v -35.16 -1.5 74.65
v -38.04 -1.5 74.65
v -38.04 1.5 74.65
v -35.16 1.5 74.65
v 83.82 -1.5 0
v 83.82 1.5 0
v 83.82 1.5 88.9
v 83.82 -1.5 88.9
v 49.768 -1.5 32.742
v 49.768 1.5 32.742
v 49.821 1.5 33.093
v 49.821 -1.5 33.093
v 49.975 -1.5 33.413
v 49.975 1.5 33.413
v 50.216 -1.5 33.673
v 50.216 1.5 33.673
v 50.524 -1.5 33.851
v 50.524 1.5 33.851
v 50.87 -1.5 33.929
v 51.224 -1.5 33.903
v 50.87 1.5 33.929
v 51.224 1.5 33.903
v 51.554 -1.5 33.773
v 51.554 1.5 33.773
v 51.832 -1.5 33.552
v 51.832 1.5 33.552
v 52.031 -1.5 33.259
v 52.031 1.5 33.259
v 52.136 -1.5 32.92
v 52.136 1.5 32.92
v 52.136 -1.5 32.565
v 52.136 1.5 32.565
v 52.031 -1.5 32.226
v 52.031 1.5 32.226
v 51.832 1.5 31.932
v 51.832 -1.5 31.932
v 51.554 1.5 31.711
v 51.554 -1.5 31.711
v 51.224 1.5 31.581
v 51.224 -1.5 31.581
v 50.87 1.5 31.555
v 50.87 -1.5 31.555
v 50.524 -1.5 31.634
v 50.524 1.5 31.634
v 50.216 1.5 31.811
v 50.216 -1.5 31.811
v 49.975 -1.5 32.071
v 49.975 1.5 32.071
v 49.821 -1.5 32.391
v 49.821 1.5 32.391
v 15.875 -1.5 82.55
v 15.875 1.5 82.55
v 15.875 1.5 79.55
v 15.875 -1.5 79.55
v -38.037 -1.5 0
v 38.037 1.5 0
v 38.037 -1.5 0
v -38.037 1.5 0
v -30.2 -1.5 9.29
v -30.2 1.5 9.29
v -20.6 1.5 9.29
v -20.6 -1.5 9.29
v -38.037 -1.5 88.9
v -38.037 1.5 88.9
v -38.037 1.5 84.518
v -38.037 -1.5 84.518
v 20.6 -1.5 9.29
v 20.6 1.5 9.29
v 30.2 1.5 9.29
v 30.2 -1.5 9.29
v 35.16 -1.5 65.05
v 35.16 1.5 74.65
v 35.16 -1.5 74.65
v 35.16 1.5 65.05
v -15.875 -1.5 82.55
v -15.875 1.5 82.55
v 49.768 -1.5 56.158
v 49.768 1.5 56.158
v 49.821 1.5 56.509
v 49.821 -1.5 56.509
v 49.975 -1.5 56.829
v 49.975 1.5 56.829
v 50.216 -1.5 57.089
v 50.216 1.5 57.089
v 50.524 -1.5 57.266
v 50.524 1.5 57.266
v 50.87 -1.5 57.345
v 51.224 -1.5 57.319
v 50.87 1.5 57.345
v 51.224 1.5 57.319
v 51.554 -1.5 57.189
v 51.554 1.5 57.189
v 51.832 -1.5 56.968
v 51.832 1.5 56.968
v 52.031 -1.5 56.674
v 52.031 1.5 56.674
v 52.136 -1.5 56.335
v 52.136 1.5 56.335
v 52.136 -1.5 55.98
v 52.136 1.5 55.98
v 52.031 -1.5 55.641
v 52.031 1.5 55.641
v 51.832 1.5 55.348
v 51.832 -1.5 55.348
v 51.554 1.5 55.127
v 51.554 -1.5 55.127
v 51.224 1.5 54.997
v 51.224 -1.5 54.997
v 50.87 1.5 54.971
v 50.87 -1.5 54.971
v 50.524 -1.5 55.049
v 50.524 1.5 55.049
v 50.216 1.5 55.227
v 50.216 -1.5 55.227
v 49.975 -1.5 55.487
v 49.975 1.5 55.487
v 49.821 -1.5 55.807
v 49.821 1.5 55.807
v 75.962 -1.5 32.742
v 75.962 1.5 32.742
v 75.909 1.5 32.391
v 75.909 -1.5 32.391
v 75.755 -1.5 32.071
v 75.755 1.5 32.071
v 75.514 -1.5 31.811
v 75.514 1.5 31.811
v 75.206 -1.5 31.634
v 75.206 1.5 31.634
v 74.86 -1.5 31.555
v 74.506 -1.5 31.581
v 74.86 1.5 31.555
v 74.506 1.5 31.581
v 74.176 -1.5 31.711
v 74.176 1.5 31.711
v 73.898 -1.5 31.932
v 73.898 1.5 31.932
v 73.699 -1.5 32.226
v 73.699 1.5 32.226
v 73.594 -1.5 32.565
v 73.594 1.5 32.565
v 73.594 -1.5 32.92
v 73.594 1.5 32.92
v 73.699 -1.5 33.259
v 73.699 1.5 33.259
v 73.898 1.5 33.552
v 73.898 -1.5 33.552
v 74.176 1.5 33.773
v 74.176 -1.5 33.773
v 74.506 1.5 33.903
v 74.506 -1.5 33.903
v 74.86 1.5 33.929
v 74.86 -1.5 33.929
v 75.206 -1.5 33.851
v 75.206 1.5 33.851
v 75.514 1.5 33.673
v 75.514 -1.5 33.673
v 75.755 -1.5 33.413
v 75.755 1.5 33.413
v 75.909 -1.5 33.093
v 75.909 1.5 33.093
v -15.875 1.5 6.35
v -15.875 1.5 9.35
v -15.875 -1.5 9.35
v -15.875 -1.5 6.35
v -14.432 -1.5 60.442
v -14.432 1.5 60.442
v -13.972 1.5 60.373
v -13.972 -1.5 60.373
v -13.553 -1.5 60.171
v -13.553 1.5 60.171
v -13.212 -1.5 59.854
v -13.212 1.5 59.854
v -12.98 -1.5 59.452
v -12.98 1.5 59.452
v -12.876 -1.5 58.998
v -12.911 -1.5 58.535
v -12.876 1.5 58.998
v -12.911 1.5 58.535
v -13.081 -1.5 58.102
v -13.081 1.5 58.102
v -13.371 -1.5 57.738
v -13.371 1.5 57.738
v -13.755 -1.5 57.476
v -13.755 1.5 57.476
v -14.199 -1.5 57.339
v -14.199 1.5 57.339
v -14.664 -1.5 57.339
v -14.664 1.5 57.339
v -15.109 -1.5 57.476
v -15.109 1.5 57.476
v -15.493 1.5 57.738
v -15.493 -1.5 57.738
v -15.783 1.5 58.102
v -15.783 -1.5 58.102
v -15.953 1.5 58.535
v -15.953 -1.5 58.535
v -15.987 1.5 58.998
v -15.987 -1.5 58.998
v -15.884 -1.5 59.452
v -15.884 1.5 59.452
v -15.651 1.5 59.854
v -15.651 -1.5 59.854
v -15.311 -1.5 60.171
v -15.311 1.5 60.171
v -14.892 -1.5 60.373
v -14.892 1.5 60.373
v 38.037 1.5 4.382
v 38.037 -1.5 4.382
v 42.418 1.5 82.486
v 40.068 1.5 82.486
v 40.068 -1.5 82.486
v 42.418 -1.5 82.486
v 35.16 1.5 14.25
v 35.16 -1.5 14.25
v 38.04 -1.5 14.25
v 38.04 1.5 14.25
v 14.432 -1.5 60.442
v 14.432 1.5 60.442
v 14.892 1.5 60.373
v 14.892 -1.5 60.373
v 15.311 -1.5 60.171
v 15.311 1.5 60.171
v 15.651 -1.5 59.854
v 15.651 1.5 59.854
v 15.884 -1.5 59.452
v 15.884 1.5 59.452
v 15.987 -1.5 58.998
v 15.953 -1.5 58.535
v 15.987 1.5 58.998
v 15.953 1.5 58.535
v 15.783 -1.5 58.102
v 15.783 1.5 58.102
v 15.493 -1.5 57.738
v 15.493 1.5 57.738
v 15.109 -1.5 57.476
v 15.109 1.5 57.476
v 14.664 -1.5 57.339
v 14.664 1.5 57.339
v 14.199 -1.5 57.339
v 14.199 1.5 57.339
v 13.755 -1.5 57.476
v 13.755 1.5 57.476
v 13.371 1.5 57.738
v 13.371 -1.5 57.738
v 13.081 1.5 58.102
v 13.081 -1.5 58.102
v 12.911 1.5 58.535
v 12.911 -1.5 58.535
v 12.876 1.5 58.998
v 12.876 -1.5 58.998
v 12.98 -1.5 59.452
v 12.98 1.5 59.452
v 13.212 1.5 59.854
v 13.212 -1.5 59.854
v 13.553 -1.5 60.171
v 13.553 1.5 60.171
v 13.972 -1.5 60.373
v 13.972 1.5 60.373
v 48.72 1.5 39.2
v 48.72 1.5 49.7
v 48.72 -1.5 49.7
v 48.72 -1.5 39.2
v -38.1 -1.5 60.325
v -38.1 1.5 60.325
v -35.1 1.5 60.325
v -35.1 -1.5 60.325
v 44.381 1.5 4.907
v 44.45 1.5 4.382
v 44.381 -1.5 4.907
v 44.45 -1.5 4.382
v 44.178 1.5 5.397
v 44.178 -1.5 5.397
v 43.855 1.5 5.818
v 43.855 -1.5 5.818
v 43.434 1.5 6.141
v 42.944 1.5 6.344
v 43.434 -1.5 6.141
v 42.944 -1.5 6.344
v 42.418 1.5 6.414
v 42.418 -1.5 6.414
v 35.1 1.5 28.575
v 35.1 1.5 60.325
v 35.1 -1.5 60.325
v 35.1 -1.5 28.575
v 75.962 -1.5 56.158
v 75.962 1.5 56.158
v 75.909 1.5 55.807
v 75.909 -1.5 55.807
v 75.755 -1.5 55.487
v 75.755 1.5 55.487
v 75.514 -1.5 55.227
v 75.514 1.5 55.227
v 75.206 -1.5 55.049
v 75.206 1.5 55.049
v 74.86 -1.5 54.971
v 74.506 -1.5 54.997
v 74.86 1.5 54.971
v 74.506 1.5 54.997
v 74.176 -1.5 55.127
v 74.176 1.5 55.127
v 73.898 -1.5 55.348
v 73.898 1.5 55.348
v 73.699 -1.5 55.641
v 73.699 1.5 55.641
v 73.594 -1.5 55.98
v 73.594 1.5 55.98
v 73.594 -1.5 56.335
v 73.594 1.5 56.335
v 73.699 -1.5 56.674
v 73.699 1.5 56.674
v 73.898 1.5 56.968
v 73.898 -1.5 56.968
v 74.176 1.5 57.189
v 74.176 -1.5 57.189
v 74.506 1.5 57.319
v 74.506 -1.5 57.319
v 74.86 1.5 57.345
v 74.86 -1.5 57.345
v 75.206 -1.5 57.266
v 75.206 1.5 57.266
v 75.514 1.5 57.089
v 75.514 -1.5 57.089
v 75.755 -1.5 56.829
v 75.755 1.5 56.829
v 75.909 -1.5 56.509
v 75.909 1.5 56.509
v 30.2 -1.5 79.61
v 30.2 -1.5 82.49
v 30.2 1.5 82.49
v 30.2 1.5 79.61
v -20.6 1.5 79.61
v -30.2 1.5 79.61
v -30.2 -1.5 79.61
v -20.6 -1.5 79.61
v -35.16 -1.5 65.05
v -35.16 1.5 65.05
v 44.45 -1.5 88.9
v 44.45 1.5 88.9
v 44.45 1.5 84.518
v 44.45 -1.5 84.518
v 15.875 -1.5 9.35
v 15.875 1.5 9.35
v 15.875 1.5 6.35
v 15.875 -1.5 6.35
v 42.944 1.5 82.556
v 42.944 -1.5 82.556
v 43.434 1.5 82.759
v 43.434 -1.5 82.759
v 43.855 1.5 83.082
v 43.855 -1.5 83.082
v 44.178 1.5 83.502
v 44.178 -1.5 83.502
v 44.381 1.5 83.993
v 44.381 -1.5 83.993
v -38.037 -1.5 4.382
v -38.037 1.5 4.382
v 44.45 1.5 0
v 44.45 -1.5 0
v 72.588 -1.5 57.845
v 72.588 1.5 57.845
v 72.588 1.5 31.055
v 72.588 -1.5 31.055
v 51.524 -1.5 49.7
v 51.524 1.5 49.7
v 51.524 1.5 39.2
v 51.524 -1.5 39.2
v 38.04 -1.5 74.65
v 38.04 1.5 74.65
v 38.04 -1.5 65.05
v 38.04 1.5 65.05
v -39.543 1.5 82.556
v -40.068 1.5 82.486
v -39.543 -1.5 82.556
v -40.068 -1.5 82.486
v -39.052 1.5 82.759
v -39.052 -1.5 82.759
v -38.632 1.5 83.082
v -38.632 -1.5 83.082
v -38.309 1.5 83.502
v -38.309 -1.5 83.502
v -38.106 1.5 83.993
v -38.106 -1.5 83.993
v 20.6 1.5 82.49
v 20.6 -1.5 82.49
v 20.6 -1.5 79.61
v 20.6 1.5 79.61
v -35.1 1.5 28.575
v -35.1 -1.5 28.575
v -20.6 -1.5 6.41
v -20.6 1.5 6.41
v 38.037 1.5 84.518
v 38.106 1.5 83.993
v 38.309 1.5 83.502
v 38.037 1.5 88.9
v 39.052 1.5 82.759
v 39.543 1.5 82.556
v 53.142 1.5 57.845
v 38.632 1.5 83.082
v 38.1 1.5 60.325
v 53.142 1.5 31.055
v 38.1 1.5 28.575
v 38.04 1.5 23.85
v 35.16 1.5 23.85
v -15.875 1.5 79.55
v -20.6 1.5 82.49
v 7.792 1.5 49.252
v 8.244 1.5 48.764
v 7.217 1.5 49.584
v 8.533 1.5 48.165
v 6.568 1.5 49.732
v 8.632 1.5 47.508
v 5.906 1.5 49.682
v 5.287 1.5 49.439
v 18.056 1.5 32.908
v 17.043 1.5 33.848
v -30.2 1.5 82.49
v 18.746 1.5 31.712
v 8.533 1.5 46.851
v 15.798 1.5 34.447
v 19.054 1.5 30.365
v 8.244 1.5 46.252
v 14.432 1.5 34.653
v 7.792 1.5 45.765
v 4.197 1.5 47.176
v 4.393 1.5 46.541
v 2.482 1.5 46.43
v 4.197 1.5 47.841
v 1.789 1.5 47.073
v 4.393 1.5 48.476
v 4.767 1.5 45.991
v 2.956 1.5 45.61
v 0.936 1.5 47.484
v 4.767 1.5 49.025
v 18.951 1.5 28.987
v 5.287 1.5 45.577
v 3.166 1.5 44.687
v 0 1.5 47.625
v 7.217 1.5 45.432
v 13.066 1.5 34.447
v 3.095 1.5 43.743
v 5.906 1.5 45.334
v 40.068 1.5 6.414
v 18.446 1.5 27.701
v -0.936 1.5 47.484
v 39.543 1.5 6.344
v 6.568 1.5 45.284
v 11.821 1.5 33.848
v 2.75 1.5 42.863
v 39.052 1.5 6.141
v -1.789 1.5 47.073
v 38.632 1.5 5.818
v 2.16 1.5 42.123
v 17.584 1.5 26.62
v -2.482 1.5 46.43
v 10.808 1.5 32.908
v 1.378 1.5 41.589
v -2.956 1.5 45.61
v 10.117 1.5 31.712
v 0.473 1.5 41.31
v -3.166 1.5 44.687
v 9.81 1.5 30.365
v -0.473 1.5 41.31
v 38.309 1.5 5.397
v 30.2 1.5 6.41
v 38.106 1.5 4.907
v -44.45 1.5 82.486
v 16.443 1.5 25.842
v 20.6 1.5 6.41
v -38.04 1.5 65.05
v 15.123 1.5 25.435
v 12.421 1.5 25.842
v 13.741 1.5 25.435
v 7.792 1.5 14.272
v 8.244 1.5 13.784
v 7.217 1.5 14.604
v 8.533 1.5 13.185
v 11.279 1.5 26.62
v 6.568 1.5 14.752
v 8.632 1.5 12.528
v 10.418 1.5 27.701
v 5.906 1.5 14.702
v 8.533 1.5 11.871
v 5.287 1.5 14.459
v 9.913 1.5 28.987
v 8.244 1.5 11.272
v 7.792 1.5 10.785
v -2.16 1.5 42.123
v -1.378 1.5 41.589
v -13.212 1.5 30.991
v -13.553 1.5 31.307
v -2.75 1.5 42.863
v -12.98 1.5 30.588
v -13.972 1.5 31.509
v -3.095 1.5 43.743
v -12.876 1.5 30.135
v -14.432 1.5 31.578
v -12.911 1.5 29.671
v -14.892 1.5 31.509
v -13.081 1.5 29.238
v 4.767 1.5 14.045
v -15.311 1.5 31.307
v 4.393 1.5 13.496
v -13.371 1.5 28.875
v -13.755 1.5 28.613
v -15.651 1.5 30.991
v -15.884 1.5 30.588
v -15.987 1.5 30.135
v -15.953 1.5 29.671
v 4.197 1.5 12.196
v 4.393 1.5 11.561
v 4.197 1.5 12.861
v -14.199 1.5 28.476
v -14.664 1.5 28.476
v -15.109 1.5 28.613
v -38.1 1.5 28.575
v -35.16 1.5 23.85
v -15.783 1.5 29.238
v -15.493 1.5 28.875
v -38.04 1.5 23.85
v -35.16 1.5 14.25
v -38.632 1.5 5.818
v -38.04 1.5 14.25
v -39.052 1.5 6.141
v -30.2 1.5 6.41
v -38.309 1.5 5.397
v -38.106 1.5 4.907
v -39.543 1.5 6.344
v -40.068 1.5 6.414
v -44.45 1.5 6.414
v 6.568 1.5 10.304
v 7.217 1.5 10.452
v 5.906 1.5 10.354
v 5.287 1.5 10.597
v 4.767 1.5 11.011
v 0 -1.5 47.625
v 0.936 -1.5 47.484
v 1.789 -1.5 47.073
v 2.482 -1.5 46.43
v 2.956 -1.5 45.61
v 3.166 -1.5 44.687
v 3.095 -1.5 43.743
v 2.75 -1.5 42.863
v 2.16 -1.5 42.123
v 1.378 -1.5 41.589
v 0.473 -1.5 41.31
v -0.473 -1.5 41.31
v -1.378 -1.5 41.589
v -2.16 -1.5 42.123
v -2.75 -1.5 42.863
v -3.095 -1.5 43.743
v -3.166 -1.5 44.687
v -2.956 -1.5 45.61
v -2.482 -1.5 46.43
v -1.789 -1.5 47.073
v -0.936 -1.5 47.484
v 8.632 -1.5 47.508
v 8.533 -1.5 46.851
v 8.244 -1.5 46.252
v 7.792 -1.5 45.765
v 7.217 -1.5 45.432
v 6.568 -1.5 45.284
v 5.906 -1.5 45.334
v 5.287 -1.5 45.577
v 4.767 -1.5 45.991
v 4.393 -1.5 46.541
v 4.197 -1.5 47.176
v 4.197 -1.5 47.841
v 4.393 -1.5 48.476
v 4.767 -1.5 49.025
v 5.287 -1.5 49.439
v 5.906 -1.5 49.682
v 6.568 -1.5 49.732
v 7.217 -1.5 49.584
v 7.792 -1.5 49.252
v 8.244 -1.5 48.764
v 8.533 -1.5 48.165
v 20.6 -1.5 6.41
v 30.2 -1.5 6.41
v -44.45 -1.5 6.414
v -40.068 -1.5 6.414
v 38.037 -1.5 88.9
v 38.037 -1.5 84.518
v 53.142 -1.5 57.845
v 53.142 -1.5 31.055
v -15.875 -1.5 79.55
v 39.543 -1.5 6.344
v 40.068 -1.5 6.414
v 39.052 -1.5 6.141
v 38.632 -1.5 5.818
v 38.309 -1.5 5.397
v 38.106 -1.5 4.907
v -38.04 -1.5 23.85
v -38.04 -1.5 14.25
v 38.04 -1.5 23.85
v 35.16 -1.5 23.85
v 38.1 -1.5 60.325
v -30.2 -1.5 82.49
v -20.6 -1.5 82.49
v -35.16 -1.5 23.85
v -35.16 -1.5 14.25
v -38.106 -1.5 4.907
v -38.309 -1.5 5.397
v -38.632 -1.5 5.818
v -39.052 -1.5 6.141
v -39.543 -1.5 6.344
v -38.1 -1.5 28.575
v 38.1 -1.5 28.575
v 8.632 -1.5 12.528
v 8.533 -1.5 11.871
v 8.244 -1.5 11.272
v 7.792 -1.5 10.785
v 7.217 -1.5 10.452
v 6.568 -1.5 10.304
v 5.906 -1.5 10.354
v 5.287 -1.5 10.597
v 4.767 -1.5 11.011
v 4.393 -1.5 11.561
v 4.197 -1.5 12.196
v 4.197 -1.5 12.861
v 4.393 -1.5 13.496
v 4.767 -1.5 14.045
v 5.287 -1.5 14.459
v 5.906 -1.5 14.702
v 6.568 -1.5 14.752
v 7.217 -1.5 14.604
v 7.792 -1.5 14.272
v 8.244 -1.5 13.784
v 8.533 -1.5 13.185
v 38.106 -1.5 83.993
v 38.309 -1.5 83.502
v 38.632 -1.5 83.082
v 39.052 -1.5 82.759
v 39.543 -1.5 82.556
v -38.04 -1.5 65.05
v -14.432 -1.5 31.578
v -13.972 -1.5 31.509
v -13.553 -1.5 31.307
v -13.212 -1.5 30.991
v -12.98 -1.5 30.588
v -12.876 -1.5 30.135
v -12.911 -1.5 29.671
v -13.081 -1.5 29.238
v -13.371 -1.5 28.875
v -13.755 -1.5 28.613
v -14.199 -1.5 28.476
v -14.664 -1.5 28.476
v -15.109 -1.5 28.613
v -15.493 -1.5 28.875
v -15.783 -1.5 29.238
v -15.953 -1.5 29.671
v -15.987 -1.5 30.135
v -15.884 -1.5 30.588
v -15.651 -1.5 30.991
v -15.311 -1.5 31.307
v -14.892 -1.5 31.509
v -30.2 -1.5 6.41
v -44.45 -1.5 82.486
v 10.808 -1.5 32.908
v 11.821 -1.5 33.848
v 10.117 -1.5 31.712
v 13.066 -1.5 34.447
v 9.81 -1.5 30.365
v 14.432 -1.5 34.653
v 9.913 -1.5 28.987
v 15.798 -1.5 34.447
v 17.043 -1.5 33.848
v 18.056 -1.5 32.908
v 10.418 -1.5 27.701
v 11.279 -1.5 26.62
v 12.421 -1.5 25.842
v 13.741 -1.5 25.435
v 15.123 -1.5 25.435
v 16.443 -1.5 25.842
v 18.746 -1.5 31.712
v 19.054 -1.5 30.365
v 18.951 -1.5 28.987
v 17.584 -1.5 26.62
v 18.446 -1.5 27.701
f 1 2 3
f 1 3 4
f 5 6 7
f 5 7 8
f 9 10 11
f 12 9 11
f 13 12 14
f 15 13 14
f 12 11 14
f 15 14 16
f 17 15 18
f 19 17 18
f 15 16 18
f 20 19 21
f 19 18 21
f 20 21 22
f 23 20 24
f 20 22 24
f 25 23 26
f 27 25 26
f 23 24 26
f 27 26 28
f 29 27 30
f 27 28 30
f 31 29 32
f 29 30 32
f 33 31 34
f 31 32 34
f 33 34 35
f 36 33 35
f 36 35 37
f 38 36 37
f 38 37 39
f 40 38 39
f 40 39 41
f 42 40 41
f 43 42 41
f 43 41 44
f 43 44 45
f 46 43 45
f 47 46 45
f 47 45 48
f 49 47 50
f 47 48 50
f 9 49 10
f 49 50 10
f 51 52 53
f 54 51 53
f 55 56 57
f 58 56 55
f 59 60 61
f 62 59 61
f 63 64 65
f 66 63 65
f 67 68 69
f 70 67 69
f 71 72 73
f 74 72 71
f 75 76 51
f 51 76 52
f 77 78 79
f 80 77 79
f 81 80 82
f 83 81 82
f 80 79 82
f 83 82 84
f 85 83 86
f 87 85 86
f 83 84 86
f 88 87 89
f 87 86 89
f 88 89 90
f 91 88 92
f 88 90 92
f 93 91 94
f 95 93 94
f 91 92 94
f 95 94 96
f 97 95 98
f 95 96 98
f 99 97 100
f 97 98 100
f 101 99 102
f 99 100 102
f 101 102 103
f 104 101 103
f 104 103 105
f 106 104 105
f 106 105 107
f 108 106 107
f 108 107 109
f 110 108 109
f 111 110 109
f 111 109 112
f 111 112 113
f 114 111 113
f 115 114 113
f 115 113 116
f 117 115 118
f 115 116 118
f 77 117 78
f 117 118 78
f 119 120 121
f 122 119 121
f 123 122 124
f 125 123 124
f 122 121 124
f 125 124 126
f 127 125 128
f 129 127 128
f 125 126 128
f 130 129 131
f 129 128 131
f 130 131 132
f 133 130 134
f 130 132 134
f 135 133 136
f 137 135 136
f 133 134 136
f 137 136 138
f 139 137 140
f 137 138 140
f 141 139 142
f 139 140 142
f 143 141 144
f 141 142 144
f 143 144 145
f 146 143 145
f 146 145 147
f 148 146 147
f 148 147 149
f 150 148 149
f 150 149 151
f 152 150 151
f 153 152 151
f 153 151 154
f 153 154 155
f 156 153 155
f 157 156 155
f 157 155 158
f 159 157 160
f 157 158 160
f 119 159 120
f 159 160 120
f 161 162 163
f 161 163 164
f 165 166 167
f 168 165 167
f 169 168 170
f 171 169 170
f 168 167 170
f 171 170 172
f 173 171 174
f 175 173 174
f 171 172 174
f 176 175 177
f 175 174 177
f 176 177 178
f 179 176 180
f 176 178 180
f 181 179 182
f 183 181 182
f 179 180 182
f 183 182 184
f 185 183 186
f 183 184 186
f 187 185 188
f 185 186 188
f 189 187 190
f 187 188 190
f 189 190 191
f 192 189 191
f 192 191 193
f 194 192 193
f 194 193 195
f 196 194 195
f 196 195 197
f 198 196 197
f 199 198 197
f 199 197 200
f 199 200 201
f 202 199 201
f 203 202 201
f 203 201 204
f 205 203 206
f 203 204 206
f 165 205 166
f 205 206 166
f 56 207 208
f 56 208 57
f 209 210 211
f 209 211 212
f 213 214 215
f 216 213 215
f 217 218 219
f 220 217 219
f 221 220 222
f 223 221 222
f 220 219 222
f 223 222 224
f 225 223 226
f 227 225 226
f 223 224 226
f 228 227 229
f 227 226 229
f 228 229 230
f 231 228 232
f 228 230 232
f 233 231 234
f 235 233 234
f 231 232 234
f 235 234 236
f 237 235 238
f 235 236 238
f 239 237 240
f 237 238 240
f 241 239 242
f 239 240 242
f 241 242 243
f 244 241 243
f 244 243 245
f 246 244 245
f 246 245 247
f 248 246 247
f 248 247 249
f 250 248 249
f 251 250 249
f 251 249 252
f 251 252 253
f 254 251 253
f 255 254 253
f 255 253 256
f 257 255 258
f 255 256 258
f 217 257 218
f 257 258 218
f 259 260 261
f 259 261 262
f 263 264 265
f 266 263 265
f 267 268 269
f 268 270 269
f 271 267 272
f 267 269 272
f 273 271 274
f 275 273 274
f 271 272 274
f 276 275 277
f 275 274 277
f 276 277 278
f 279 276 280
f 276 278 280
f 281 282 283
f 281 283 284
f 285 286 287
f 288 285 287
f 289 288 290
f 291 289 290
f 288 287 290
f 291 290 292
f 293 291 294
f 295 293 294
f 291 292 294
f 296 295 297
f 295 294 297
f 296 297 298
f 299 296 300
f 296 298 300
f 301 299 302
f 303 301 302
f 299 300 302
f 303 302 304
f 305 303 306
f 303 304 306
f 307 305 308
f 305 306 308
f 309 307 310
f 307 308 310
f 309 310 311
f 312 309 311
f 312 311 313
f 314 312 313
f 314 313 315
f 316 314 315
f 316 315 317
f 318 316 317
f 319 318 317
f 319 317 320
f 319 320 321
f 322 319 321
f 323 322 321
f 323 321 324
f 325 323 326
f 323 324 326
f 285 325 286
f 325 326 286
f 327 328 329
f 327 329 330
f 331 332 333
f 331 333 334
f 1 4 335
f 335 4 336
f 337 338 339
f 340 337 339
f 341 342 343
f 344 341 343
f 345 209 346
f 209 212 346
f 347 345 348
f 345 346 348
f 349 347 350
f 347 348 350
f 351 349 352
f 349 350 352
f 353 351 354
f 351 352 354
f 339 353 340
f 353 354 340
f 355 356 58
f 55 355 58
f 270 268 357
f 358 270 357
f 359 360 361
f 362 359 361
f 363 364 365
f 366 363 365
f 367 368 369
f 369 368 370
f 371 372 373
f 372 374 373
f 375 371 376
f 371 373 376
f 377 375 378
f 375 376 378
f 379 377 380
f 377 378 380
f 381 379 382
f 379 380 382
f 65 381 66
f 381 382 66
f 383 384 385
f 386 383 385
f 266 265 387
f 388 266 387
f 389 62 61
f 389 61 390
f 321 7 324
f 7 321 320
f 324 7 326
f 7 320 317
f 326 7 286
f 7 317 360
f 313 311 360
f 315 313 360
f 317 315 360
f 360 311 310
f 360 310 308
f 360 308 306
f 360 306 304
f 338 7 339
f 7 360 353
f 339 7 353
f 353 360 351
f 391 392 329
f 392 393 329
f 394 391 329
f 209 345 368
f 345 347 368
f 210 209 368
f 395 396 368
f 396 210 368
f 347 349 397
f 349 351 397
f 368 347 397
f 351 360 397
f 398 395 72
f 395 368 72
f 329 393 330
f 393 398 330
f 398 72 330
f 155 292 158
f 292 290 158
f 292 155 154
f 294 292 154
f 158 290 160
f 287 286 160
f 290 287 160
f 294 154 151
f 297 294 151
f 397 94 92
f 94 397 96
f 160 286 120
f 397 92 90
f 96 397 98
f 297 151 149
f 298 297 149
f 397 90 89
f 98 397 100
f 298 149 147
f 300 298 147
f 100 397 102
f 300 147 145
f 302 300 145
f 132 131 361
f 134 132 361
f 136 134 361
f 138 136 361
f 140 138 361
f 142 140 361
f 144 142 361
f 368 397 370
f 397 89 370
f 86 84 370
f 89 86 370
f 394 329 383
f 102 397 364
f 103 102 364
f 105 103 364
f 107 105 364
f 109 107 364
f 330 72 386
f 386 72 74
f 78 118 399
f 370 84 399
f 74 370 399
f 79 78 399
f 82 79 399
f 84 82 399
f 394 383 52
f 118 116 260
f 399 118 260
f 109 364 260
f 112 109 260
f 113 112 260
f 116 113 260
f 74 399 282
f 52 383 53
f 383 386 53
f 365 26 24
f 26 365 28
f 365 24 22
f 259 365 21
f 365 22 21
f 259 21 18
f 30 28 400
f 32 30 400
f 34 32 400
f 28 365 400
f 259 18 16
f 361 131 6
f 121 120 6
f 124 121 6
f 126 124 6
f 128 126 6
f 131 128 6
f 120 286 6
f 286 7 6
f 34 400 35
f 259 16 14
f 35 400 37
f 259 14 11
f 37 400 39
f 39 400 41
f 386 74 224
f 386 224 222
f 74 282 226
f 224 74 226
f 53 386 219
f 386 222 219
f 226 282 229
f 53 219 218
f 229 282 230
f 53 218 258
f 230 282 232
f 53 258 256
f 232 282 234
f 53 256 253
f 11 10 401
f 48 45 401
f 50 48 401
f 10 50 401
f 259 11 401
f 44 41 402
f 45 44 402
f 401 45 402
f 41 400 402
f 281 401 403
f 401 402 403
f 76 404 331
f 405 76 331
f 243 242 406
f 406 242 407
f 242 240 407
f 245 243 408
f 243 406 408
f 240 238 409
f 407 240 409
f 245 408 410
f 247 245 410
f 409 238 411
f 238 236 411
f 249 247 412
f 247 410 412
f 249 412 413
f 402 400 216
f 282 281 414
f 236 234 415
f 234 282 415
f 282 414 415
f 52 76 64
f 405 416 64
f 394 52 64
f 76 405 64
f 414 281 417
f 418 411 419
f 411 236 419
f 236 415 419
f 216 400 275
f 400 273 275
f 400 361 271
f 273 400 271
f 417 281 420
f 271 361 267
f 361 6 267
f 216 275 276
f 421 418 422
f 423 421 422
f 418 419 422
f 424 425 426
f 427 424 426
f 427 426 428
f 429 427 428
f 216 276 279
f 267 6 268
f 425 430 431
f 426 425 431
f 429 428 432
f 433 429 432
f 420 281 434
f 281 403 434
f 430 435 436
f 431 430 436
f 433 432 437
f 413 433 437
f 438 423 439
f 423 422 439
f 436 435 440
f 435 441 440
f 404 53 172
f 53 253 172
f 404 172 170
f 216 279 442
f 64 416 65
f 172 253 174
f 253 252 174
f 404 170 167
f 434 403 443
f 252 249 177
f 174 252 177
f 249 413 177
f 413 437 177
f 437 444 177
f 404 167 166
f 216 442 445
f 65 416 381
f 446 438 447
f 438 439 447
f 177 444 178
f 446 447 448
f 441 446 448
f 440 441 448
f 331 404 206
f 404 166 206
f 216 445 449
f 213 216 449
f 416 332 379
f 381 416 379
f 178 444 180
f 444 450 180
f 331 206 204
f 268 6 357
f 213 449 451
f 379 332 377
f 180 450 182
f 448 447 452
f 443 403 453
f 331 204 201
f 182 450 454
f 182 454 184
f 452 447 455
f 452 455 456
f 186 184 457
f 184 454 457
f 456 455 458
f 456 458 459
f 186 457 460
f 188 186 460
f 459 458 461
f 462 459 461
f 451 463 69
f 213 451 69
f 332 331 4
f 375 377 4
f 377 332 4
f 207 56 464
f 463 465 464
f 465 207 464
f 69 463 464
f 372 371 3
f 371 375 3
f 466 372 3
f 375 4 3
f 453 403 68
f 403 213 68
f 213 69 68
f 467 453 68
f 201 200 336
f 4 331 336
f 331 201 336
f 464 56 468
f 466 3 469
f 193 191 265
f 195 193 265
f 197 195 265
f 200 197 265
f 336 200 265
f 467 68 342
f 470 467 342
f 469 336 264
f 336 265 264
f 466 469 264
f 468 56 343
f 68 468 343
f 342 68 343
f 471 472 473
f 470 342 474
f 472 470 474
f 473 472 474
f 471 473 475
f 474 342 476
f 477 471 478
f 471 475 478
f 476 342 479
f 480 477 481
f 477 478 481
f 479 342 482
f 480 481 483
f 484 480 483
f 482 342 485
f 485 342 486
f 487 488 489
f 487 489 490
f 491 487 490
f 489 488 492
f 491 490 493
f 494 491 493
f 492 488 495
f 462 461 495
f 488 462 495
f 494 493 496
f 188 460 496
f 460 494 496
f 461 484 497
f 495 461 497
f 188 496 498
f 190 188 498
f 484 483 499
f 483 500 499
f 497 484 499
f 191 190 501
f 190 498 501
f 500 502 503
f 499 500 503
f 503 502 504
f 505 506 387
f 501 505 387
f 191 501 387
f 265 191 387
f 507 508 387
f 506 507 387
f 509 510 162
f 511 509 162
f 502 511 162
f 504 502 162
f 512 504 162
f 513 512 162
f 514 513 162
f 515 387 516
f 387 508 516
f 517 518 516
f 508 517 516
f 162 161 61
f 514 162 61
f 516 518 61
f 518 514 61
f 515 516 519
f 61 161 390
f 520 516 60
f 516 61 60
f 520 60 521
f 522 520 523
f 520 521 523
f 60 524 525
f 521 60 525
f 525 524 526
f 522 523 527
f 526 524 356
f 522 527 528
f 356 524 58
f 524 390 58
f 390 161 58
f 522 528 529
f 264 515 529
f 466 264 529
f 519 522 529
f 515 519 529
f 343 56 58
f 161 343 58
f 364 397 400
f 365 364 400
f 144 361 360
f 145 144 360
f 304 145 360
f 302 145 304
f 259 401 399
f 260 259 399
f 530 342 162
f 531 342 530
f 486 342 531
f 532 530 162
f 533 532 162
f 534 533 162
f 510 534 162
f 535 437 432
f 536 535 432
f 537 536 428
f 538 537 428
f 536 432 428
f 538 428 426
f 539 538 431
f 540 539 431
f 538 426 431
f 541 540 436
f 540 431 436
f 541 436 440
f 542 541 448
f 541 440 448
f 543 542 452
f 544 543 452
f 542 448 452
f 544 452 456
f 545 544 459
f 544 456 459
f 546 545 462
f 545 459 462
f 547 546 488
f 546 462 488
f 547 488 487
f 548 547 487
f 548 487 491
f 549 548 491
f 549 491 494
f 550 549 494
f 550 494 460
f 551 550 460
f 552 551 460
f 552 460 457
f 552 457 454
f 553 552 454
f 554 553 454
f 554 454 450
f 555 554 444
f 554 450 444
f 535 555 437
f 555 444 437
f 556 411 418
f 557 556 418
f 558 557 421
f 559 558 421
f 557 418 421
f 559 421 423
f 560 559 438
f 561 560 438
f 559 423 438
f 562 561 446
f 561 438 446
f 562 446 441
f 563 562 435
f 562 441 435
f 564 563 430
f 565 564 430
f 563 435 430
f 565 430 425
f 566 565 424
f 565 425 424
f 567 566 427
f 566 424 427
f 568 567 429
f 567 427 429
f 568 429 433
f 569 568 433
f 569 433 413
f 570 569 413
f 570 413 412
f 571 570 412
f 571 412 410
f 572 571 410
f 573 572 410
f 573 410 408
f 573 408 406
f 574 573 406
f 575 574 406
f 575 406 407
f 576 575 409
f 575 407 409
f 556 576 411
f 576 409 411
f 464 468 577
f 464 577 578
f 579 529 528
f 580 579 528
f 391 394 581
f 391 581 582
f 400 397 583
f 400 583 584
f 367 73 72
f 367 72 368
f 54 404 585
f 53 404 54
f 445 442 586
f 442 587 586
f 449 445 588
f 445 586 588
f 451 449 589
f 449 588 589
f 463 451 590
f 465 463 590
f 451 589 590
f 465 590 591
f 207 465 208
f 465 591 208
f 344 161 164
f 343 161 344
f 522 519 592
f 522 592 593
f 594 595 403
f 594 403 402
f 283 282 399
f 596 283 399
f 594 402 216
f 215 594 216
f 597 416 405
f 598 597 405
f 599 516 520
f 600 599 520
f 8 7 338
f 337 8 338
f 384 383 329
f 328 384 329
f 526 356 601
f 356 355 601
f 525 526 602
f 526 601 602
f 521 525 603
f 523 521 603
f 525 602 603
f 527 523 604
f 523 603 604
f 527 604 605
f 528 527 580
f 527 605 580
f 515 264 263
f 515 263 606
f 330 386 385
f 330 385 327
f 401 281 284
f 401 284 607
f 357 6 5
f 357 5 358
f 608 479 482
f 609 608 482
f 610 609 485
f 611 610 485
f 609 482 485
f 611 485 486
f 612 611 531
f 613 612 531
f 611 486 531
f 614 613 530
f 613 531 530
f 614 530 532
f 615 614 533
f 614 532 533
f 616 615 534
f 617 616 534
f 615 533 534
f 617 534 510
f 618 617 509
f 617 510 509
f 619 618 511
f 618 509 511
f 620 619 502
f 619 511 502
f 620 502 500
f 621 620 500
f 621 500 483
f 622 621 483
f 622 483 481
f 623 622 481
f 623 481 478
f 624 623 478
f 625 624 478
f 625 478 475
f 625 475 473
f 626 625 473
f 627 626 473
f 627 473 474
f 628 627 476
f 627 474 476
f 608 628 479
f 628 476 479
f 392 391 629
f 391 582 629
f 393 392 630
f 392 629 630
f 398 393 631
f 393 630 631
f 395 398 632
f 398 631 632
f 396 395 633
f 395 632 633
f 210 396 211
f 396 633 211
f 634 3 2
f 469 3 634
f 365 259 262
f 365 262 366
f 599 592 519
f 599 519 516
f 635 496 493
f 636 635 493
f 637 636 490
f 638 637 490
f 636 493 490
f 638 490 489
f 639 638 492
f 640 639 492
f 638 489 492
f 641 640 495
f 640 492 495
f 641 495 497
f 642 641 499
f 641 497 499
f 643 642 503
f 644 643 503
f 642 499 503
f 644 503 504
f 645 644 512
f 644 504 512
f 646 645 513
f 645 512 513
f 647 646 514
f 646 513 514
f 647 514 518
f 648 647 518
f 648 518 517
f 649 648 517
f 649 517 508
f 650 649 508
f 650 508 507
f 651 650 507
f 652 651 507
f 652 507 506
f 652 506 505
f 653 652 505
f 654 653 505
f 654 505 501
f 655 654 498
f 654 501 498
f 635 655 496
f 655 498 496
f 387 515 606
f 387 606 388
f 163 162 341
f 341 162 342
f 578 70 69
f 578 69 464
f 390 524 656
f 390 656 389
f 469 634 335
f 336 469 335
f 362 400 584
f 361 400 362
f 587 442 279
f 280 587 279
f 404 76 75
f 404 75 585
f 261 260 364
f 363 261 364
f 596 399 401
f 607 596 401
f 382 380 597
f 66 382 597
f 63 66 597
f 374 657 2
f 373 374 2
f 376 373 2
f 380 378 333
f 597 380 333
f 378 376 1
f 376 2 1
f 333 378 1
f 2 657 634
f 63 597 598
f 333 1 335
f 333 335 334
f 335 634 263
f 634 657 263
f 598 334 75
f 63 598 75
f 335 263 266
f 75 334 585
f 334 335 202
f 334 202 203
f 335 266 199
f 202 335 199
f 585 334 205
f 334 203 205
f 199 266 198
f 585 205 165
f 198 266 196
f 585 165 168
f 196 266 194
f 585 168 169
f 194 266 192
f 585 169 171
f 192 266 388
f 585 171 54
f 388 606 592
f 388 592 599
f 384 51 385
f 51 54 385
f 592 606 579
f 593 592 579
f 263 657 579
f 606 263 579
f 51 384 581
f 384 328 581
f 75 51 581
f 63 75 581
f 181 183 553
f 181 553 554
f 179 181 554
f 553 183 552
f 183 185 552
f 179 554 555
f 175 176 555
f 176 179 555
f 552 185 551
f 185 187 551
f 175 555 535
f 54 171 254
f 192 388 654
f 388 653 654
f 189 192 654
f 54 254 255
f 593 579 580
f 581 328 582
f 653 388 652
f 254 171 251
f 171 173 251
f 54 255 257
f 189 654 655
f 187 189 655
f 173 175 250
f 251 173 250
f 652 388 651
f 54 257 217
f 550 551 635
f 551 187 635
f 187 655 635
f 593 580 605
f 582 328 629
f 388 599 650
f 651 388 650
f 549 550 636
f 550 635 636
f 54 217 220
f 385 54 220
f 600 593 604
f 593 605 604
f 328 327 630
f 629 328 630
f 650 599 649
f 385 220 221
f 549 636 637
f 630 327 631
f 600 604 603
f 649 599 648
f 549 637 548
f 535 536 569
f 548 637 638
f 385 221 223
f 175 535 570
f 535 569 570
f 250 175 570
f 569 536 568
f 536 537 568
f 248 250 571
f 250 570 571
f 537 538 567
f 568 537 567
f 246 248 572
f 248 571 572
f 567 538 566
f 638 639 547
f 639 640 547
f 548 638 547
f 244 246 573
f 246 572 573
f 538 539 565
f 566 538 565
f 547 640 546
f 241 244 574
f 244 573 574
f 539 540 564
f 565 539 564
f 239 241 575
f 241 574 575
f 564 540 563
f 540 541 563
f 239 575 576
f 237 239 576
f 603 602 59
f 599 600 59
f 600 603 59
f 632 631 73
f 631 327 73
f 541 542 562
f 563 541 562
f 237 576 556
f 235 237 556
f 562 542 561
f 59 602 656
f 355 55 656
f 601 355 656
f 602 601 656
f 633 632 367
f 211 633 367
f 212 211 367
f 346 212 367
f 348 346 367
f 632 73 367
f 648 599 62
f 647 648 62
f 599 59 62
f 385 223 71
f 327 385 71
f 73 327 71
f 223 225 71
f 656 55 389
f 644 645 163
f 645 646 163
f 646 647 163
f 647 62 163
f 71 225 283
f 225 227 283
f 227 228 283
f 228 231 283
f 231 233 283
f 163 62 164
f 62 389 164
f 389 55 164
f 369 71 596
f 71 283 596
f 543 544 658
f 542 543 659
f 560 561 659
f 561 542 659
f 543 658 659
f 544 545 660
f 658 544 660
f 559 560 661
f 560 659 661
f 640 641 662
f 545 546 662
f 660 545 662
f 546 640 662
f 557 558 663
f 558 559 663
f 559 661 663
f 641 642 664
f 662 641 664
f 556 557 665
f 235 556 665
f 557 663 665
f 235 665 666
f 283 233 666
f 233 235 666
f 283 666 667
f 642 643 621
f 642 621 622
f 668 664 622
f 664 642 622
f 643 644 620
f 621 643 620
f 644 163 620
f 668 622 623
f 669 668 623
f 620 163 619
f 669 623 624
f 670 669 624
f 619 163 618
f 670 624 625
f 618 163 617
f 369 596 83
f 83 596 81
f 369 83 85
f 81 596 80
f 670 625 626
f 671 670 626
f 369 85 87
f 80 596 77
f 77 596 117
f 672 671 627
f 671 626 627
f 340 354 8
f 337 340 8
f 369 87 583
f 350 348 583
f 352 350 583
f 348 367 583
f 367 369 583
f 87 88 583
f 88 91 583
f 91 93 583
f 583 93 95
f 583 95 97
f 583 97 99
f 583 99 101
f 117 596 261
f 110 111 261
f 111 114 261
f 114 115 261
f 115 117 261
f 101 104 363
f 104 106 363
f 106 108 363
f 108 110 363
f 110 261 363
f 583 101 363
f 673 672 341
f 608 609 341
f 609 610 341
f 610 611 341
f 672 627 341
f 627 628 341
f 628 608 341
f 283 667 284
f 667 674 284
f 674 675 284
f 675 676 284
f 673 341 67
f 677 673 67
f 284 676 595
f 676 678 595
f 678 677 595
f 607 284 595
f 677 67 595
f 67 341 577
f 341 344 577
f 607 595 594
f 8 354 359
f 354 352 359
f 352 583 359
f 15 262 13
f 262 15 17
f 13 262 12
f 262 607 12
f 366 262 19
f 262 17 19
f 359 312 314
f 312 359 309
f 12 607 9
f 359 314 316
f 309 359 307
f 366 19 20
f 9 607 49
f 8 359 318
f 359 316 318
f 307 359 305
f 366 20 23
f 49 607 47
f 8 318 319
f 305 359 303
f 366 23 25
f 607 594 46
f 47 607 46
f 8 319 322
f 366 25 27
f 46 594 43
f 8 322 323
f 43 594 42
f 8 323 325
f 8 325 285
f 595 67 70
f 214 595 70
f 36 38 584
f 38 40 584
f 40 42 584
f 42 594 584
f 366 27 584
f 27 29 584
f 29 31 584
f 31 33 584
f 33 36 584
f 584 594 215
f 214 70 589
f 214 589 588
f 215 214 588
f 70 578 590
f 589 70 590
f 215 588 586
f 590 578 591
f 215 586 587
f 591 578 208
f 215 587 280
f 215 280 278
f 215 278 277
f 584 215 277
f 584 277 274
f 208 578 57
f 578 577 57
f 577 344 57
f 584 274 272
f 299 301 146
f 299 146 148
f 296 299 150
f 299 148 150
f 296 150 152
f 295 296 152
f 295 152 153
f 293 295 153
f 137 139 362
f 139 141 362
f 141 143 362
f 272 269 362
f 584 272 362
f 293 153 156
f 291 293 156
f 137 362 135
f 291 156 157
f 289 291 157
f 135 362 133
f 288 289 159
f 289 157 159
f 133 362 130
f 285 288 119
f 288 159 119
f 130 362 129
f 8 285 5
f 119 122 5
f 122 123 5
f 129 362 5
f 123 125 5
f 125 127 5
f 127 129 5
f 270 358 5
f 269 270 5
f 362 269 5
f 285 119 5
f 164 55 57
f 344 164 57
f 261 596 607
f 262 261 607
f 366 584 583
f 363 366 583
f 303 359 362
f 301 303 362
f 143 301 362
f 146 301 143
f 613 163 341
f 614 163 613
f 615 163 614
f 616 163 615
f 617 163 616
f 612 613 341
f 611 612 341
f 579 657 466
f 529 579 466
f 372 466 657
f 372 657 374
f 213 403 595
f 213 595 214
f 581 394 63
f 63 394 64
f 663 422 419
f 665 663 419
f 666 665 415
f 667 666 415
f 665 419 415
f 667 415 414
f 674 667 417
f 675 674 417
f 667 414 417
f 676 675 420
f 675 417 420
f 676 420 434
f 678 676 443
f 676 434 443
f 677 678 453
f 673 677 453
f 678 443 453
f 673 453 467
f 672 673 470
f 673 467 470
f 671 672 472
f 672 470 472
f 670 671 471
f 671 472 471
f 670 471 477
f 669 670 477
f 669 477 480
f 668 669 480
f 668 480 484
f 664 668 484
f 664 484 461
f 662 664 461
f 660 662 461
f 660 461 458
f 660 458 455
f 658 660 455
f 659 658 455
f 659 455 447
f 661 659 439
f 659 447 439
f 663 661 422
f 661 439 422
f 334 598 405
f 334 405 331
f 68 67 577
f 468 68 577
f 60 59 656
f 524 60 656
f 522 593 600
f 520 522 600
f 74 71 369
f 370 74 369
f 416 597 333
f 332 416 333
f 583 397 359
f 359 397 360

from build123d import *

# Parameters (mm, degrees)
EXTRUDE_1_DEPTH     = 88.9
SKETCH_4_R          = 1.5
SKETCH_4_W          = 31.75
SKETCH_4_H          = 3
SKETCH_4_W_2        = 3
SKETCH_4_H_2        = 31.75
CUT_EXTRUDE_1_DEPTH = 3
SKETCH_5_R          = 1.56
CUT_EXTRUDE_2_DEPTH = 3
SKETCH_7_R          = 4.635
SKETCH_7_R_2        = 2.23
CUT_EXTRUDE_3_DEPTH = 3
SKETCH_8_W          = 9.6
SKETCH_8_H          = 2.88
SKETCH_8_W_2        = 2.88
SKETCH_8_H_2        = 9.6
CUT_EXTRUDE_4_DEPTH = 3
SKETCH_9_R          = 3.175
CUT_EXTRUDE_5_DEPTH = 3
SKETCH_13_W         = 6.4135
SKETCH_13_H         = 6.4135
CUT_EXTRUDE_7_DEPTH = 5.08
FILLET_2_R          = 2.032
SKETCH_18_R         = 1.190625
SKETCH_18_W         = 19.446875
SKETCH_18_H         = 26.7890625
CUT_EXTRUDE_8_DEPTH = 3
SKETCH_19_W         = 2.804
SKETCH_19_H         = 10.5
CUT_EXTRUDE_9_DEPTH = 2000


with BuildPart() as part:
    # 스케치2 → 보스-돌출1 (new body)
    with BuildSketch(Plane.XY):
        Polygon((-44.45, 1.5), (44.45, 1.5), (83.82, 1.5), (83.82, -1.5), (44.45, -1.5), (-44.45, -1.5), align=None)
    extrude(amount=EXTRUDE_1_DEPTH)

    # 스케치4 → 컷-돌출1 (cut)
    with BuildSketch(Plane(origin=(0, 1.5, 0), x_dir=(1, 0, 0), z_dir=(0, 1, 0))):
        with Locations(Location((-41.275, -85.725, 0), (0, 0, 270))):
            Circle(SKETCH_4_R)
        with Locations(Location((-41.275, -3.175, 0), (0, 0, 270))):
            Circle(SKETCH_4_R)
        with Locations(Location((41.275, -3.175, 0), (0, 0, 270))):
            Circle(SKETCH_4_R)
        with Locations(Location((41.275, -85.725, 0), (0, 0, 270))):
            Circle(SKETCH_4_R)
        with Locations((0, -81.05)):
            Rectangle(SKETCH_4_W, SKETCH_4_H)
        with Locations((-36.6, -44.45)):
            Rectangle(SKETCH_4_W_2, SKETCH_4_H_2)
        with Locations((0, -7.85)):
            Rectangle(SKETCH_4_W, SKETCH_4_H)
        with Locations((36.6, -44.45)):
            Rectangle(SKETCH_4_W_2, SKETCH_4_H_2)
    extrude(amount=-CUT_EXTRUDE_1_DEPTH, mode=Mode.SUBTRACT)

    # 스케치5 → 컷-돌출2 (cut)
    with BuildSketch(Plane(origin=(0, 1.5, 0), x_dir=(1, 0, 0), z_dir=(0, 1, 0))):
        with Locations(Location((-14.431818182, -30.018181818, 0), (0, 0, 270))):
            Circle(SKETCH_5_R)
        with Locations(Location((14.431818182, -30.018181818, 0), (0, 0, 270))):
            Circle(SKETCH_5_R)
        with Locations(Location((14.431818182, -58.881818182, 0), (0, 0, 270))):
            Circle(SKETCH_5_R)
        with Locations(Location((-14.431818182, -58.881818182, 0), (0, 0, 270))):
            Circle(SKETCH_5_R)
    extrude(amount=-CUT_EXTRUDE_2_DEPTH, mode=Mode.SUBTRACT)

    # 스케치7 → 컷-돌출3 (cut)
    with BuildSketch(Plane(origin=(0, 1.5, 0), x_dir=(1, 0, 0), z_dir=(0, 1, 0))):
        with Locations(Location((14.431818182, -30.018181818, 0), (0, 0, 270))):
            Circle(SKETCH_7_R)
        with Locations((6.401818182, -47.508181818)):
            Circle(SKETCH_7_R_2)
        with Locations((6.401818182, -12.528181818)):
            Circle(SKETCH_7_R_2)
    extrude(amount=-CUT_EXTRUDE_3_DEPTH, mode=Mode.SUBTRACT)

    # 스케치8 → 컷-돌출4 (cut)
    with BuildSketch(Plane(origin=(0, 1.5, 0), x_dir=(1, 0, 0), z_dir=(0, 1, 0))):
        with Locations((-25.4, -7.85)):
            Rectangle(SKETCH_8_W, SKETCH_8_H)
        with Locations((-36.6, -19.05)):
            Rectangle(SKETCH_8_W_2, SKETCH_8_H_2)
        with Locations((36.6, -19.05)):
            Rectangle(SKETCH_8_W_2, SKETCH_8_H_2)
        with Locations((25.4, -7.85)):
            Rectangle(SKETCH_8_W, SKETCH_8_H)
        with Locations((36.6, -69.85)):
            Rectangle(SKETCH_8_W_2, SKETCH_8_H_2)
        with Locations((25.4, -81.05)):
            Rectangle(SKETCH_8_W, SKETCH_8_H)
        with Locations((-25.4, -81.05)):
            Rectangle(SKETCH_8_W, SKETCH_8_H)
        with Locations((-36.6, -69.85)):
            Rectangle(SKETCH_8_W_2, SKETCH_8_H_2)
    extrude(amount=-CUT_EXTRUDE_4_DEPTH, mode=Mode.SUBTRACT)

    # 스케치9 → 컷-돌출5 (cut)
    with BuildSketch(Plane(origin=(0, 1.5, 0), x_dir=(1, 0, 0), z_dir=(0, 1, 0))):
        with Locations(Location((0, -44.45, 0), (0, 0, 270))):
            Circle(SKETCH_9_R)
    extrude(amount=-CUT_EXTRUDE_5_DEPTH, mode=Mode.SUBTRACT)

    # 스케치13 → 컷-돌출7 (cut)
    with BuildSketch(Plane(origin=(0, 1.5, 0), x_dir=(1, 0, 0), z_dir=(0, 1, 0))):
        with Locations((-41.24325, -85.69325)):
            Rectangle(SKETCH_13_W, SKETCH_13_H)
        with Locations((-41.24325, -3.20675)):
            Rectangle(SKETCH_13_W, SKETCH_13_H)
        with Locations((41.24325, -3.20675)):
            Rectangle(SKETCH_13_W, SKETCH_13_H)
        with Locations((41.24325, -85.69325)):
            Rectangle(SKETCH_13_W, SKETCH_13_H)
    extrude(amount=-CUT_EXTRUDE_7_DEPTH, mode=Mode.SUBTRACT)

    # 필렛2
    fillet_2_edges = [part.edges().sort_by_distance(p)[0] for p in [
        (44.45, 0, 82.4865),
        (38.0365, 0, 82.4865),
        (44.45, 0, 6.4135),
        (38.0365, 0, 6.4135),
        (-38.0365, 0, 6.4135),
        (-38.0365, 0, 82.4865),
    ]]
    fillet(fillet_2_edges, radius=FILLET_2_R)

    # 스케치18 → 컷-돌출8 (cut)
    with BuildSketch(Plane(origin=(0, 1.5, 0), x_dir=(1, 0, 0), z_dir=(0, 1, 0))):
        with Locations(Location((50.95875, -56.1578125, 0), (0, 0, 180))):
            Circle(SKETCH_18_R)
        with Locations(Location((50.95875, -32.7421875, 0), (0, 0, 180))):
            Circle(SKETCH_18_R)
        with Locations((74.77125, -32.7421875)):
            Circle(SKETCH_18_R)
        with Locations((74.77125, -56.1578125)):
            Circle(SKETCH_18_R)
        with Locations((62.865, -44.45)):
            Rectangle(SKETCH_18_W, SKETCH_18_H)
    extrude(amount=-CUT_EXTRUDE_8_DEPTH, mode=Mode.SUBTRACT)

    # 스케치19 → 컷-돌출9 (cut)
    with BuildSketch(Plane(origin=(0, 1.5, 0), x_dir=(1, 0, 0), z_dir=(0, 1, 0))):
        with Locations((50.122375, -44.45)):
            Rectangle(SKETCH_19_W, SKETCH_19_H)
    extrude(amount=-CUT_EXTRUDE_9_DEPTH, mode=Mode.SUBTRACT)


solid = part.part
